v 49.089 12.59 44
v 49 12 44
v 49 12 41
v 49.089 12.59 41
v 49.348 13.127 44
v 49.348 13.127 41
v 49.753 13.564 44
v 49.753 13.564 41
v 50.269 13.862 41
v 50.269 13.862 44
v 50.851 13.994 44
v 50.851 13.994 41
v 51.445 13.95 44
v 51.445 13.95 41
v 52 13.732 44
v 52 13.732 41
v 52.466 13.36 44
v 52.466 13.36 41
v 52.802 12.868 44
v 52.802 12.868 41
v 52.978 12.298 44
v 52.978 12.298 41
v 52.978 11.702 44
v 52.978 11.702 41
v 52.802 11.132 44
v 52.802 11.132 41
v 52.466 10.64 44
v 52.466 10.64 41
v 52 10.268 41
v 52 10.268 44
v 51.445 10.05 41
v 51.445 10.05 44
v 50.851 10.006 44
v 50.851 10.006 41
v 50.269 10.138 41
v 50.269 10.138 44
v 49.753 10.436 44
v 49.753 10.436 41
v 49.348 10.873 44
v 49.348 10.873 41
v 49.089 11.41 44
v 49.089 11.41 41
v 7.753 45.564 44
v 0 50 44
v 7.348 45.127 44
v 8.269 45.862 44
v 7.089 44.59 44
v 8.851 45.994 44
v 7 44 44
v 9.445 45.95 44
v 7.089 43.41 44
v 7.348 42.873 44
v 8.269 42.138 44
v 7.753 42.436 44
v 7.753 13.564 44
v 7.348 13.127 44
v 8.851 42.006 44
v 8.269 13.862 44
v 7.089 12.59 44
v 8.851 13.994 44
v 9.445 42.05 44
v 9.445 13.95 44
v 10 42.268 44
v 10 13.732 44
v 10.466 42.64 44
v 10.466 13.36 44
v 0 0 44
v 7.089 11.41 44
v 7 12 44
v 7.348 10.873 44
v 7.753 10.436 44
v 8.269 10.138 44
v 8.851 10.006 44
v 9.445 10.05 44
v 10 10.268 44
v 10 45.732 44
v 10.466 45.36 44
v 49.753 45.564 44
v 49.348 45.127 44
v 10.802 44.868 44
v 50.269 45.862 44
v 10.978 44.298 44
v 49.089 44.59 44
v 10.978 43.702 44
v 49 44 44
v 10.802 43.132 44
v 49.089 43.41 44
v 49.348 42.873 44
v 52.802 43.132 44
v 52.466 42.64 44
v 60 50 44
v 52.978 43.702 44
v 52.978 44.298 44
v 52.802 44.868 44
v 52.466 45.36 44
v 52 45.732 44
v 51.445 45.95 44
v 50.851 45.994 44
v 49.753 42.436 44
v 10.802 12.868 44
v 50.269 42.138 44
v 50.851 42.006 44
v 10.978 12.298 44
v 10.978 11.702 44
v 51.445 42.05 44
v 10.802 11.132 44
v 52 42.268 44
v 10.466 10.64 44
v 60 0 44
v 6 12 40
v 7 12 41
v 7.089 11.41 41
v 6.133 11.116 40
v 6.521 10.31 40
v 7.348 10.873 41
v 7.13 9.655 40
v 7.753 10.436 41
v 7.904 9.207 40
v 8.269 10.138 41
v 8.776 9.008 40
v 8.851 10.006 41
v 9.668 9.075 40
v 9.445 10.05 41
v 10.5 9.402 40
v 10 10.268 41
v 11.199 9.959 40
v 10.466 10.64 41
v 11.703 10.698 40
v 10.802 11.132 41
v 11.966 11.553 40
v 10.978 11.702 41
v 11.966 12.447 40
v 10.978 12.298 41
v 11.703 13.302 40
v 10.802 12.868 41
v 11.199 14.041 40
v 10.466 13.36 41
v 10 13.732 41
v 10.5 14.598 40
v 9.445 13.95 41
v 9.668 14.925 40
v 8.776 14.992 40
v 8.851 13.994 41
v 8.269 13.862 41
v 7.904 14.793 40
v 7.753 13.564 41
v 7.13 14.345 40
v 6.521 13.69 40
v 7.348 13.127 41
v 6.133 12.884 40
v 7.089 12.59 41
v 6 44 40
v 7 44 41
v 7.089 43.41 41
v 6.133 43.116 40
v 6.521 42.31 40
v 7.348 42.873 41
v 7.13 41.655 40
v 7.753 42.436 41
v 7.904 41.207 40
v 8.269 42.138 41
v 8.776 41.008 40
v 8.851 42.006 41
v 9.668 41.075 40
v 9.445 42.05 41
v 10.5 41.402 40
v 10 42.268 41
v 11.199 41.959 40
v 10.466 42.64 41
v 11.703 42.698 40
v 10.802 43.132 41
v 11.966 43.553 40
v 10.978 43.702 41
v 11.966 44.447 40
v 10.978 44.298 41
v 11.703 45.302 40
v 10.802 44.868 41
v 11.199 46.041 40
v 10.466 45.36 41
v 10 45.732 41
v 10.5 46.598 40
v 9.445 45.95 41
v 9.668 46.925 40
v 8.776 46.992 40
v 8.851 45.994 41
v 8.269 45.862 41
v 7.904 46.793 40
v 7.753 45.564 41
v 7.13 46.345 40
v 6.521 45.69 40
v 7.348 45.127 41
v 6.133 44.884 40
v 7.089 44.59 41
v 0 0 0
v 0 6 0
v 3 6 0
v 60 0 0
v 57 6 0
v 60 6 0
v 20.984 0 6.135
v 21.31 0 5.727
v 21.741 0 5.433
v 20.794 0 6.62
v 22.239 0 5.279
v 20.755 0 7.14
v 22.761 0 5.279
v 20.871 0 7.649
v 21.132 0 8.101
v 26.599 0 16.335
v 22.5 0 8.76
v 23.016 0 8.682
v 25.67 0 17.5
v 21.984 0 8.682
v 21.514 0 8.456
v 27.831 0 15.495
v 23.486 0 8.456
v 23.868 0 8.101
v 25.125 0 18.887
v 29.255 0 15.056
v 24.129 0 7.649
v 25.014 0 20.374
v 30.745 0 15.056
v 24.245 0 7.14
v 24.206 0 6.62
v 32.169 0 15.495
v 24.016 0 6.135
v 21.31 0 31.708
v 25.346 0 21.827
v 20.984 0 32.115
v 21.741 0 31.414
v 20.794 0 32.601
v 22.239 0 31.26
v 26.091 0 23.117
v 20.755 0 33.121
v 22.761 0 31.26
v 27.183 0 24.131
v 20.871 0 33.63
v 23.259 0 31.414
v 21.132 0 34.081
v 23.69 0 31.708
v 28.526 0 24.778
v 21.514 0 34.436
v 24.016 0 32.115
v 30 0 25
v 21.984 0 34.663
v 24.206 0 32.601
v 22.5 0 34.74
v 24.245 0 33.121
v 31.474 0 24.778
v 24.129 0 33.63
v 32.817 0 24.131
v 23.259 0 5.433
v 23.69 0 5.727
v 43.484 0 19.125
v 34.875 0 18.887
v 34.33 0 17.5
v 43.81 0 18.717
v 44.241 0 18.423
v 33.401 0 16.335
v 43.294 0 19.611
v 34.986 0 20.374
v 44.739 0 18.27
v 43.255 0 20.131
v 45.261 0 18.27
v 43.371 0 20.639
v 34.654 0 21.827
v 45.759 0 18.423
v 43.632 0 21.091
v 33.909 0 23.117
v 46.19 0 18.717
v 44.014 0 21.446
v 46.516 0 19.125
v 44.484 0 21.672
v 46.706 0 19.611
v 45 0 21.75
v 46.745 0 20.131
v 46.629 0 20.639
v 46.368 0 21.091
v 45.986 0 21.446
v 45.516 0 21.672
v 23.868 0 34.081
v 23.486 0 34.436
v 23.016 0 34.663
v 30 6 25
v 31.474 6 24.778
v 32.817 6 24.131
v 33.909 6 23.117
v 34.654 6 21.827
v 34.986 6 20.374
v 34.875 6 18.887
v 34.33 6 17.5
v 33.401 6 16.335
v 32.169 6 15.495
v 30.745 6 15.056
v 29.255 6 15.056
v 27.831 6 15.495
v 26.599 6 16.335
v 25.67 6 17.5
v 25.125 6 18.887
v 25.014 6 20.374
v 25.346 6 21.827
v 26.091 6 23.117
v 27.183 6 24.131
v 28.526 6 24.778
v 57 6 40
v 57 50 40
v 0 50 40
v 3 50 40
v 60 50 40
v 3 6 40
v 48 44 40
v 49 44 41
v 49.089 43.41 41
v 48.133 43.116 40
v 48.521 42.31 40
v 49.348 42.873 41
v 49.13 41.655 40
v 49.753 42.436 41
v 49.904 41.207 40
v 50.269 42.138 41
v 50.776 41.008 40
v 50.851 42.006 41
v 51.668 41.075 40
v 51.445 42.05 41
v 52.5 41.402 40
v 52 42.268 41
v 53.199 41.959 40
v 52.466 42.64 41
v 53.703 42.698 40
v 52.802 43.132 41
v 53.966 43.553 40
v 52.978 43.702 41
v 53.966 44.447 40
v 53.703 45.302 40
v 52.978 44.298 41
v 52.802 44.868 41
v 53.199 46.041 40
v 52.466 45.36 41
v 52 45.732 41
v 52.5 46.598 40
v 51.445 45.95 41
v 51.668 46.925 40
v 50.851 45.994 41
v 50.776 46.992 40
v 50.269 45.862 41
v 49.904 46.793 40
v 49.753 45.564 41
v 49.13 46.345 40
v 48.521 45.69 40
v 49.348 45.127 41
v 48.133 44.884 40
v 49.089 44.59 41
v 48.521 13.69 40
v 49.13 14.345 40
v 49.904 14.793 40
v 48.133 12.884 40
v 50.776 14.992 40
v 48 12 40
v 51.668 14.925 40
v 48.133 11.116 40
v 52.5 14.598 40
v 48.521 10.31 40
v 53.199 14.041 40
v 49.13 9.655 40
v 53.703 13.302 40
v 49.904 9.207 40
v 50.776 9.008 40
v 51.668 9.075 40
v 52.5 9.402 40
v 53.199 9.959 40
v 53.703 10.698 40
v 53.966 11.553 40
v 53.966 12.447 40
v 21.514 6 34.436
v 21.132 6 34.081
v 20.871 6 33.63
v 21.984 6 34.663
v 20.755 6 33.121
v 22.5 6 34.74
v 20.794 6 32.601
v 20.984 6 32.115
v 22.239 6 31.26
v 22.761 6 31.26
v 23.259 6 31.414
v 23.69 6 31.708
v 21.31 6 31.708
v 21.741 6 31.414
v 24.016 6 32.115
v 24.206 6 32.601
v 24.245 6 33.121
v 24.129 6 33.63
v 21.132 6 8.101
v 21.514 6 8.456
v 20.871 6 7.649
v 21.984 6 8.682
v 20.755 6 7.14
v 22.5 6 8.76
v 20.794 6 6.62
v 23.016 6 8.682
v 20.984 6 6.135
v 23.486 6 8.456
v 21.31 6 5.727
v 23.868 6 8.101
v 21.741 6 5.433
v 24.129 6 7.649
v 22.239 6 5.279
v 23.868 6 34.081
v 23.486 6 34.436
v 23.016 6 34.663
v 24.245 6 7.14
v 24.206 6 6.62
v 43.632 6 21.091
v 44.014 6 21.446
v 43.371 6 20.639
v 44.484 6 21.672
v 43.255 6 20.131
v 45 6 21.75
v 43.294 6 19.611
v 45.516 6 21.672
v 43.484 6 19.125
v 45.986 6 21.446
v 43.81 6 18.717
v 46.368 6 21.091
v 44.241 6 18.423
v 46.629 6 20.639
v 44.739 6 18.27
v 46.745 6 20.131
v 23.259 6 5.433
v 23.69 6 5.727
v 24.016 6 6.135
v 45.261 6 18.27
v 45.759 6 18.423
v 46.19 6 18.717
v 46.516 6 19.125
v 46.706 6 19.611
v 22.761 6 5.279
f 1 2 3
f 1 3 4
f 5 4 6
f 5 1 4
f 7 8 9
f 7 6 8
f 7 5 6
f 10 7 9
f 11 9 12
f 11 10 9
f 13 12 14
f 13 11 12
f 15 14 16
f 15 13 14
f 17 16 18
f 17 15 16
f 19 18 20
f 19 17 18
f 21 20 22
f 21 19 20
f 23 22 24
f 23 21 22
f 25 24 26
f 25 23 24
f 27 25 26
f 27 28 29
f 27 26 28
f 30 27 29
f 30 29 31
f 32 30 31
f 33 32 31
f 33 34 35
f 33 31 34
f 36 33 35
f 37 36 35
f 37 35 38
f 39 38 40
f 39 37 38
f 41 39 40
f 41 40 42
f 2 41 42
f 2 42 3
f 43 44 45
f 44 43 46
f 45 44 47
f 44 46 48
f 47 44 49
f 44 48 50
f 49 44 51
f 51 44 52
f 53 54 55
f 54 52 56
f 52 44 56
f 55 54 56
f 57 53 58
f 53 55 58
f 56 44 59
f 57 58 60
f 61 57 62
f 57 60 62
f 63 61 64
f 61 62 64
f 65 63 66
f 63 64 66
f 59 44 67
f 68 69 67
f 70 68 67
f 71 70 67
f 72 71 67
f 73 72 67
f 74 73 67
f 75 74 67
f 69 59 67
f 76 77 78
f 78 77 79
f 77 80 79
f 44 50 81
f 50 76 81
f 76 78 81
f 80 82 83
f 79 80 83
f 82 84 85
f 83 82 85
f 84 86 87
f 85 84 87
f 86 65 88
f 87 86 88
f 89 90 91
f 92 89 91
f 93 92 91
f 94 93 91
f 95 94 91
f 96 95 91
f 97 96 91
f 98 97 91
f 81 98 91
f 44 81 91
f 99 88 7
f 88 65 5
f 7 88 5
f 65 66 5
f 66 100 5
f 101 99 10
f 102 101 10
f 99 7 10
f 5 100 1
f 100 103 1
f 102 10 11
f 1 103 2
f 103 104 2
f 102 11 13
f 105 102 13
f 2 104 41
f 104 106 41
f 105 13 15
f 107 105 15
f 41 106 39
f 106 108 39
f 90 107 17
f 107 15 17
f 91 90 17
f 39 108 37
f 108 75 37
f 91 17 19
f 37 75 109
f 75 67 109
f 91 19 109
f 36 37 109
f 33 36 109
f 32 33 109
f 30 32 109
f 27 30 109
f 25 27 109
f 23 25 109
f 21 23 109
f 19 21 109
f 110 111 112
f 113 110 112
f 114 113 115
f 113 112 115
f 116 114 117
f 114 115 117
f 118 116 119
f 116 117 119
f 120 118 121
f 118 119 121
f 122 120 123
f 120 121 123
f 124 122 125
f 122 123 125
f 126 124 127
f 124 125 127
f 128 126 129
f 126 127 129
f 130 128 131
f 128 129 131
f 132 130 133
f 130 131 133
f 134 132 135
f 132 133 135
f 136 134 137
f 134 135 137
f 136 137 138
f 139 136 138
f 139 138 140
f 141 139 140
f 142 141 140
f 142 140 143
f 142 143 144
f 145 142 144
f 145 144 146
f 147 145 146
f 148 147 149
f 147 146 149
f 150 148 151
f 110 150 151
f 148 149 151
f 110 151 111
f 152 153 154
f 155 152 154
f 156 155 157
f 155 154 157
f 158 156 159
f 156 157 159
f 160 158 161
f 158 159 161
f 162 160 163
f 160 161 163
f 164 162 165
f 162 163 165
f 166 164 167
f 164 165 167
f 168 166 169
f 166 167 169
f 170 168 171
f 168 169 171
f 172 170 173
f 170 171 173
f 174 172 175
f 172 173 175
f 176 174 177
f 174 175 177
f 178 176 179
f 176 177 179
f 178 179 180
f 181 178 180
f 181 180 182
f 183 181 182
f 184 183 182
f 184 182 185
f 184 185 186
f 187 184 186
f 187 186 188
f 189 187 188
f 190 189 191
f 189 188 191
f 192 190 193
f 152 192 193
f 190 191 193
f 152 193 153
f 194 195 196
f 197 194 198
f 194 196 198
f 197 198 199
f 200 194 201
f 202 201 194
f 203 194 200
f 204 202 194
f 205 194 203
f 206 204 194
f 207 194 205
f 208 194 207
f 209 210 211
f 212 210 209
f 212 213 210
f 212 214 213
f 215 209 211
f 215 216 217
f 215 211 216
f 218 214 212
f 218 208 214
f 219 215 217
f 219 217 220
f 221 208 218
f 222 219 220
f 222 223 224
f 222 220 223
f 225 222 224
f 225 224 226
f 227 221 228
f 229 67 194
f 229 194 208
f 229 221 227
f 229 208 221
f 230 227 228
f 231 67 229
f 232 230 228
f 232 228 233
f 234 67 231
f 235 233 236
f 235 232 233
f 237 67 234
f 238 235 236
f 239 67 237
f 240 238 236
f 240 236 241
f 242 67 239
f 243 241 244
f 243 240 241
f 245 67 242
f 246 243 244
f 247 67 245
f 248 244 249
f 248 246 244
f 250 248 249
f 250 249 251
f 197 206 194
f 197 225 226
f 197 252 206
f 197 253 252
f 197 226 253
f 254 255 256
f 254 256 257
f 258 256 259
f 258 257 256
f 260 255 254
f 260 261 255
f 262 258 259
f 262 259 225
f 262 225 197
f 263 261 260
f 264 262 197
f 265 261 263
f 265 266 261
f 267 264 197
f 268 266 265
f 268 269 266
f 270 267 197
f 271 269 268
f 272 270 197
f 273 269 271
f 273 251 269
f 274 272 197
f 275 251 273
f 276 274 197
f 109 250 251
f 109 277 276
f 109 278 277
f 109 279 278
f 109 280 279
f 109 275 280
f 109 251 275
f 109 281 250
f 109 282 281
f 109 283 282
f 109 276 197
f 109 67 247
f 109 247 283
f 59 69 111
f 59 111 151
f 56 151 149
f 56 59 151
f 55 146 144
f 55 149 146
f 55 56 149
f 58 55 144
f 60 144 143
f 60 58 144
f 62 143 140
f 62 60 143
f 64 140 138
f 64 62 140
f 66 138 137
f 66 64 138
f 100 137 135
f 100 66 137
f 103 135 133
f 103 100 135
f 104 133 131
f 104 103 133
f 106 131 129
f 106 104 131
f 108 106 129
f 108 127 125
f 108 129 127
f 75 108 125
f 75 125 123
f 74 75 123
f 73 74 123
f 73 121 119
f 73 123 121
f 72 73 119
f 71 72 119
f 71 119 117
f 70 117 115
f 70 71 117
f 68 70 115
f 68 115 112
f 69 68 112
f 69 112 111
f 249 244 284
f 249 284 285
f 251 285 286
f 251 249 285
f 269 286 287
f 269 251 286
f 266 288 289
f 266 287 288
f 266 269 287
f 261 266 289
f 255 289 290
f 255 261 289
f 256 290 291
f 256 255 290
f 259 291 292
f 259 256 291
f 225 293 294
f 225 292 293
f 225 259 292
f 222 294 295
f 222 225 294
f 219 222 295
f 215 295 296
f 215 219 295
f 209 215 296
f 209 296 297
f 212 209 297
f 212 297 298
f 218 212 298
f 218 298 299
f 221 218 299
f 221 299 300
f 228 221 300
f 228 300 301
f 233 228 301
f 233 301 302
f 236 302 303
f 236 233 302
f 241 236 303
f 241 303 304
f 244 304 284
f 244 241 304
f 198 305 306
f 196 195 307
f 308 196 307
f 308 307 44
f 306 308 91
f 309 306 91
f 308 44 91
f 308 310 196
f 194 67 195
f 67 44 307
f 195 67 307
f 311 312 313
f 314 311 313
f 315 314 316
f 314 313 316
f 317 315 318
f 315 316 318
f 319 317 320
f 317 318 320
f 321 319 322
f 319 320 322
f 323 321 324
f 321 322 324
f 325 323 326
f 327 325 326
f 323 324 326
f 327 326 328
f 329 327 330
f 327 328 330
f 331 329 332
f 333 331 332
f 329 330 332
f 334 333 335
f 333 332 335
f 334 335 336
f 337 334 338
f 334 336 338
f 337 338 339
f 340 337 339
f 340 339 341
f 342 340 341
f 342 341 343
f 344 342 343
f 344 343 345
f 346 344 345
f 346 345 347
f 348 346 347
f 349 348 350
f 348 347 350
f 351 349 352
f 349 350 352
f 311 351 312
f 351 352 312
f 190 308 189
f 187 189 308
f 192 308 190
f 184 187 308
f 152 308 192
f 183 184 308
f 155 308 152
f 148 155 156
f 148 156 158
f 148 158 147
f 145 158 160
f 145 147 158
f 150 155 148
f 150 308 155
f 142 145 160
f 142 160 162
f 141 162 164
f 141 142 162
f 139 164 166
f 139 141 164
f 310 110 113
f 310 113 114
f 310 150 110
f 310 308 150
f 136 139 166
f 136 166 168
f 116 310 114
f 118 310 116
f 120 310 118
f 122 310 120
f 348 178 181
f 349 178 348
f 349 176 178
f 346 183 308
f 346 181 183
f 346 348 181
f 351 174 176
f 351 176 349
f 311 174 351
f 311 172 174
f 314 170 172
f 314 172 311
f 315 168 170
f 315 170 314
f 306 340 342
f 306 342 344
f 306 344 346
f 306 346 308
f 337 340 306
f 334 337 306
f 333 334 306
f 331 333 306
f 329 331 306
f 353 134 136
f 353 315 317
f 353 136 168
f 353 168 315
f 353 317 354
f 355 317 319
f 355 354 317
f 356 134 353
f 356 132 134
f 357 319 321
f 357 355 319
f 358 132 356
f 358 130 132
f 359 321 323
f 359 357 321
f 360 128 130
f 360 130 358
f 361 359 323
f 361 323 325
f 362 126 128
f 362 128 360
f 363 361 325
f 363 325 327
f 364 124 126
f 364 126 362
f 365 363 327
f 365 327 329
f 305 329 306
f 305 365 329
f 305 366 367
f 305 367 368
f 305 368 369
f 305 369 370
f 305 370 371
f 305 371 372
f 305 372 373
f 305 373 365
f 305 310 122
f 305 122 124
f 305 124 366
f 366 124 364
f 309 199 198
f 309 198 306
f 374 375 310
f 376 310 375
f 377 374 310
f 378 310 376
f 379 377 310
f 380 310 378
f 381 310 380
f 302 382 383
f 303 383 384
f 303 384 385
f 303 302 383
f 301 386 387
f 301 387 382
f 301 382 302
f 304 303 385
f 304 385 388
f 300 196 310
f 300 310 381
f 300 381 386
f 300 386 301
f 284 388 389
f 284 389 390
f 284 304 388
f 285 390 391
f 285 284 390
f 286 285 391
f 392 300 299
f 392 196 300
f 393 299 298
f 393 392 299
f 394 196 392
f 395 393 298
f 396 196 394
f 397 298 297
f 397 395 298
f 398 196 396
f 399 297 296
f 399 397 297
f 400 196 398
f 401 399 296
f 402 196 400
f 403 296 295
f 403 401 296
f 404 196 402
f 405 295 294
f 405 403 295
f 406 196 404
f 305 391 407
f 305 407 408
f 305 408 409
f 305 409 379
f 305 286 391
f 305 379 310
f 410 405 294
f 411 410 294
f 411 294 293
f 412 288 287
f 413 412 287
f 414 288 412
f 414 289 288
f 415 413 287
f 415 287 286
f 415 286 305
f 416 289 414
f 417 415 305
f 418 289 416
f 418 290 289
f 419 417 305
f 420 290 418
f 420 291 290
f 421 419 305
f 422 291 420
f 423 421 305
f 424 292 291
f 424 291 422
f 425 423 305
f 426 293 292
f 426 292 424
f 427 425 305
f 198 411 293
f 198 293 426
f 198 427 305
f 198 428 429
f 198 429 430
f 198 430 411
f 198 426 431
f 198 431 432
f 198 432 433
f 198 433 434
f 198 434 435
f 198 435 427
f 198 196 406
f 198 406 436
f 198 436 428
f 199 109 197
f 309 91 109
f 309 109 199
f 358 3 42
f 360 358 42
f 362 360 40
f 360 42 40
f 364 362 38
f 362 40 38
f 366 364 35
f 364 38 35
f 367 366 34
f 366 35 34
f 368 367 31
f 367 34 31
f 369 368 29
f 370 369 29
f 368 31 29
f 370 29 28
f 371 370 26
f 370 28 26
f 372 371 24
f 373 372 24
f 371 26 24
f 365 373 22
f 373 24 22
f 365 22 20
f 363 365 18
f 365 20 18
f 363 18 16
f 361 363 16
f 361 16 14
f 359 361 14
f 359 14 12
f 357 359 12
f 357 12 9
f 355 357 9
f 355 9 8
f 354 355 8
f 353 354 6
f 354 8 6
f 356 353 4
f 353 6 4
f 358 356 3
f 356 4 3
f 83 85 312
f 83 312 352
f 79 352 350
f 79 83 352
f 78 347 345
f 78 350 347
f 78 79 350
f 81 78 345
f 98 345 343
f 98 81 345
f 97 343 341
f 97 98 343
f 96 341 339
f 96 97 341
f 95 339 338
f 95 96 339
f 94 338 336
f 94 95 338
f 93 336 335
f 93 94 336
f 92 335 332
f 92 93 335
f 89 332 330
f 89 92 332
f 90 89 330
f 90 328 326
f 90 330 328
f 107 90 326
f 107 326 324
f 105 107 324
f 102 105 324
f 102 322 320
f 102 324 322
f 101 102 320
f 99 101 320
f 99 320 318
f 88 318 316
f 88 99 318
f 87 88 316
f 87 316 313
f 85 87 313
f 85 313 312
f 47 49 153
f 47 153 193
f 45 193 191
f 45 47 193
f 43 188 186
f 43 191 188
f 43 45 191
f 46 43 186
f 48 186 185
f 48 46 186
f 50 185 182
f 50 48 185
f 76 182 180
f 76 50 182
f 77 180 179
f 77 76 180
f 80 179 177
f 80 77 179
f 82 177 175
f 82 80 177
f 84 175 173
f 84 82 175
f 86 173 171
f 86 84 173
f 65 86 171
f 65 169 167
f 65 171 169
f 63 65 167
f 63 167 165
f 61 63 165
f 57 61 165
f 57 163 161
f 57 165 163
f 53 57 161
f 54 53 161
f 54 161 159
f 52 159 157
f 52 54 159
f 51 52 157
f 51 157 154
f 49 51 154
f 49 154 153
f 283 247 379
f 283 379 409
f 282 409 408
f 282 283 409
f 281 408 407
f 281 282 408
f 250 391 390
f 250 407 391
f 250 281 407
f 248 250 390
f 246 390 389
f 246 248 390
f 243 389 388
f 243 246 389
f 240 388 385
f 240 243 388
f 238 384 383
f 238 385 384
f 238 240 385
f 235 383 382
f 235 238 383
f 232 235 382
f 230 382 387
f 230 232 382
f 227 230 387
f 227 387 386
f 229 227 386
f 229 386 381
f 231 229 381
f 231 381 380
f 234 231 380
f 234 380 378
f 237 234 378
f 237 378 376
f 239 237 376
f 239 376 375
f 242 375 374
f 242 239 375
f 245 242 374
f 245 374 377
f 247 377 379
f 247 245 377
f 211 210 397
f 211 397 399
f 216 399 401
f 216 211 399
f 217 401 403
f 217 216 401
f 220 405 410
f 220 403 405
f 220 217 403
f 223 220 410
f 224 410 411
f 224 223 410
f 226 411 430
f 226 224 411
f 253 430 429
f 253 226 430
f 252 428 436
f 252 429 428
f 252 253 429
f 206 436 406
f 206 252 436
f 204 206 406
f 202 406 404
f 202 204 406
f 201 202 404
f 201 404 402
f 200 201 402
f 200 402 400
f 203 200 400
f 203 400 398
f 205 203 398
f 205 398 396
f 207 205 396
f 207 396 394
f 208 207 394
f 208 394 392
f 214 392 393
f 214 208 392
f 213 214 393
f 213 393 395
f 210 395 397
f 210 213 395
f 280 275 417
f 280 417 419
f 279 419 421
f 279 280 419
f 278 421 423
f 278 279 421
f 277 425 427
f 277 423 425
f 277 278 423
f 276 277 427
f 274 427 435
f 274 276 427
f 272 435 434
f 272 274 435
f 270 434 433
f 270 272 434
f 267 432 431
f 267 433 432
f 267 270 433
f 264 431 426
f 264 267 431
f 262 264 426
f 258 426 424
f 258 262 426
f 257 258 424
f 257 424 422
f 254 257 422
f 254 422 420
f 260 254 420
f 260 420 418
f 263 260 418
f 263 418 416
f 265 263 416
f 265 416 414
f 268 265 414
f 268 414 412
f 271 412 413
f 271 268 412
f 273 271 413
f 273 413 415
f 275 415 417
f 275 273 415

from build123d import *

# Parameters (mm, degrees)
ESQUISSE1_W                  = 60
ESQUISSE1_H                  = 6
BOSS_EXTRU_1_DEPTH           = 40
ENL_V_MAT_EXTRU_1_DEPTH      = 73.360210061
ENL_V_MAT_EXTRU_1_DEPTH_BACK = 73.360210061
ESQUISSE2_R                  = 5
ENL_V_MAT_EXTRU_3_DEPTH      = 73.360210061
ENL_V_MAT_EXTRU_3_DEPTH_BACK = 73.360210061
ESQUISSE4_R                  = 1.75
ESQUISSE7_W                  = 60
ESQUISSE7_H                  = 4
BOSS_EXTRU_2_DEPTH           = 50
BOSS_EXTRU_3_DEPTH           = 3
BOSS_EXTRU_4_START           = -60
BOSS_EXTRU_4_DEPTH           = 3
ENL_V_MAT_EXTRU_4_DEPTH      = 88.749643874
ENL_V_MAT_EXTRU_4_DEPTH_BACK = 88.749643874
ESQUISSE9_R                  = 2
CHANFREIN1_SIZE              = 1


with BuildPart() as part:
    # Esquisse1 → Boss.-Extru.1 (new body)
    with BuildSketch(Plane.XY):
        with Locations((30, 3)):
            Rectangle(ESQUISSE1_W, ESQUISSE1_H)
    extrude(amount=BOSS_EXTRU_1_DEPTH)

    # Esquisse2 → Enlèv. mat.-Extru.1 (cut, two sides: drawn at the far end of the back side and taken through both)
    with BuildSketch(Plane(origin=(0, 6, 0), x_dir=(1, 0, 0), z_dir=(0, 1, 0)).offset(-ENL_V_MAT_EXTRU_1_DEPTH_BACK)):
        with Locations(Location((30, -20, 0), (0, 0, 270))):
            Circle(ESQUISSE2_R)
    extrude(amount=ENL_V_MAT_EXTRU_1_DEPTH + ENL_V_MAT_EXTRU_1_DEPTH_BACK, mode=Mode.SUBTRACT)

    # Esquisse4 → Enlèv. mat.-Extru.3 (cut, two sides: drawn at the far end of the back side and taken through both)
    with BuildSketch(Plane(origin=(0, 6, 0), x_dir=(1, 0, 0), z_dir=(0, 1, 0)).offset(-ENL_V_MAT_EXTRU_3_DEPTH_BACK)):
        with Locations(Location((45, -20, 0), (0, 0, 270))):
            Circle(ESQUISSE4_R)
        with Locations(Location((22.5, -32.990381057, 0), (0, 0, 270))):
            Circle(ESQUISSE4_R)
        with Locations(Location((22.5, -7.009618943, 0), (0, 0, 270))):
            Circle(ESQUISSE4_R)
    extrude(amount=ENL_V_MAT_EXTRU_3_DEPTH + ENL_V_MAT_EXTRU_3_DEPTH_BACK, mode=Mode.SUBTRACT)

    # Esquisse7 → Boss.-Extru.2 (add)
    with BuildSketch(Plane.XZ):
        with Locations((30, 42)):
            Rectangle(ESQUISSE7_W, ESQUISSE7_H)
    extrude(amount=-BOSS_EXTRU_2_DEPTH)

    # Esquisse8 → Boss.-Extru.3 (add)
    with BuildSketch(Plane(origin=(60, 0, 0), x_dir=(0, 0, -1), z_dir=(1, 0, 0))):
        Polygon((0, 6), (-40, 50), (-40, 6), align=None)
    extrude(amount=-BOSS_EXTRU_3_DEPTH)

    # Esquisse8<2> → Boss.-Extru.4 (add)
    with BuildSketch(Plane(origin=(60, 0, 0), x_dir=(0, 0, -1), z_dir=(1, 0, 0)).offset(BOSS_EXTRU_4_START)):
        Polygon((0, 6), (-40, 50), (-40, 6), align=None)
    extrude(amount=BOSS_EXTRU_4_DEPTH)

    # Esquisse9 → Enlèv. mat.-Extru.4 (cut, two sides: drawn at the far end of the back side and taken through both)
    with BuildSketch(Plane(origin=(0, 0, 40), x_dir=(-1, 0, 0), z_dir=(0, 0, -1)).offset(-ENL_V_MAT_EXTRU_4_DEPTH_BACK)):
        with Locations((-51, 12)):
            Circle(ESQUISSE9_R)
        with Locations((-51, 44)):
            Circle(ESQUISSE9_R)
        with Locations((-9, 44)):
            Circle(ESQUISSE9_R)
        with Locations((-9, 12)):
            Circle(ESQUISSE9_R)
    extrude(amount=ENL_V_MAT_EXTRU_4_DEPTH + ENL_V_MAT_EXTRU_4_DEPTH_BACK, mode=Mode.SUBTRACT)

    # Chanfrein1
    chanfrein1_edges = [part.edges().sort_by_distance(p)[0] for p in [
        (11, 12, 40),
        (11, 44, 40),
        (53, 44, 40),
        (53, 12, 40),
    ]]
    chamfer(chanfrein1_edges, length=CHANFREIN1_SIZE)


solid = part.part
